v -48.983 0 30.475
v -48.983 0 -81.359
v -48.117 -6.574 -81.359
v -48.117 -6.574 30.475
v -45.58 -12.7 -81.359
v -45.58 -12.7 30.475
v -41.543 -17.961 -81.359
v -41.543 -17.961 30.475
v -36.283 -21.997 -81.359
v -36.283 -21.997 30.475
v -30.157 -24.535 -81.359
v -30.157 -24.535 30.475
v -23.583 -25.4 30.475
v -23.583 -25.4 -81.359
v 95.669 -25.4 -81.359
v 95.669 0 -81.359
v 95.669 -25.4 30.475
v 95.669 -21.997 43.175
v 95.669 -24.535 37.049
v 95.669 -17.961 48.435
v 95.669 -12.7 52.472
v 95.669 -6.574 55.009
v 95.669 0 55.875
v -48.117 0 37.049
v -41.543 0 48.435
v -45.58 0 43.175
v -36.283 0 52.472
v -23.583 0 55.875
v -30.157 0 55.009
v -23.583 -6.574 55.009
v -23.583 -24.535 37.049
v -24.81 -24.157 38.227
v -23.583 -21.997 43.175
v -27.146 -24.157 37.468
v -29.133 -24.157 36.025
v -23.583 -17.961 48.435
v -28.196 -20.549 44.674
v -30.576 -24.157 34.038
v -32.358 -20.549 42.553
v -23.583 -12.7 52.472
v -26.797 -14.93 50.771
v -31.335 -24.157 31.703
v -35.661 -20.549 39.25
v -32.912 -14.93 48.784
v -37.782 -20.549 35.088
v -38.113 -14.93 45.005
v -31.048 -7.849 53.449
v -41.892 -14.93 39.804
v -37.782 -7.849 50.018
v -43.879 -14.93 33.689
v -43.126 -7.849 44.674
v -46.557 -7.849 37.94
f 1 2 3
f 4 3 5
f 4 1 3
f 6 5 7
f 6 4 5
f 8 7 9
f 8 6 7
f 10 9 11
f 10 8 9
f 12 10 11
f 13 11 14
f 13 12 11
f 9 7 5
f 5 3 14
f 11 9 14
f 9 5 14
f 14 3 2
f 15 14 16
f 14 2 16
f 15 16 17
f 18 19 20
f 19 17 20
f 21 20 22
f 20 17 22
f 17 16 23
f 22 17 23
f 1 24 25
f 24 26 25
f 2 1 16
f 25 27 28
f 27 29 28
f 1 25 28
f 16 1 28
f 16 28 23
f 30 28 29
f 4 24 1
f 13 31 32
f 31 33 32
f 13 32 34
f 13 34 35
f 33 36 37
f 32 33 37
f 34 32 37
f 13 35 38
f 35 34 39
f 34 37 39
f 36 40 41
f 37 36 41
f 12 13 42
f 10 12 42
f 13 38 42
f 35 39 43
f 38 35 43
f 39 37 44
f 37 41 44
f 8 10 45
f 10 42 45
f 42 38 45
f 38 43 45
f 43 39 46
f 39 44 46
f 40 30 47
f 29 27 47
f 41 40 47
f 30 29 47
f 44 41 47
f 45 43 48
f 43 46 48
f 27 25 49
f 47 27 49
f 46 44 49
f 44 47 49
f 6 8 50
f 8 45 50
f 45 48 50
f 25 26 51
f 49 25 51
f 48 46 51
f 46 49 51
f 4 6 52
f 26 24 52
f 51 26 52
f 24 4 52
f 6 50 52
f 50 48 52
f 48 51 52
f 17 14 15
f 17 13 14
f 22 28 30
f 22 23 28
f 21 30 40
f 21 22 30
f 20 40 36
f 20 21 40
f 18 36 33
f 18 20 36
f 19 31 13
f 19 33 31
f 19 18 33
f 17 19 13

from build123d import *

# Parameters (mm, degrees)
F0_W     = 144.6518152952
F0_H     = 137.2342258692
F2_DEPTH = 25.4
F1_R     = 25.39999


# Not quite as in the source:
# - a fillet or chamfer is up to 0.001 mm smaller than in the source, because OpenCascade refuses the exact size


with BuildPart() as f2:
    # F0 (on Front) → F2 (new body)
    with BuildSketch(Plane.XZ):
        with Locations((23.3432799578, -12.742228806)):
            Rectangle(F0_W, F0_H)
    extrude(amount=F2_DEPTH)

    # F1 (radius 25.4 in the source; OpenCascade refuses exactly that, so slightly less here)
    f1_edges = [f2.edges().sort_by_distance(p)[0] for p in [
        (-48.982628, -12.7, 55.874884),
        (23.34328, -25.4, 55.874884),
        (-48.982628, -25.4, -12.742229),
    ]]
    fillet(f1_edges, radius=F1_R)


solid = f2.part
